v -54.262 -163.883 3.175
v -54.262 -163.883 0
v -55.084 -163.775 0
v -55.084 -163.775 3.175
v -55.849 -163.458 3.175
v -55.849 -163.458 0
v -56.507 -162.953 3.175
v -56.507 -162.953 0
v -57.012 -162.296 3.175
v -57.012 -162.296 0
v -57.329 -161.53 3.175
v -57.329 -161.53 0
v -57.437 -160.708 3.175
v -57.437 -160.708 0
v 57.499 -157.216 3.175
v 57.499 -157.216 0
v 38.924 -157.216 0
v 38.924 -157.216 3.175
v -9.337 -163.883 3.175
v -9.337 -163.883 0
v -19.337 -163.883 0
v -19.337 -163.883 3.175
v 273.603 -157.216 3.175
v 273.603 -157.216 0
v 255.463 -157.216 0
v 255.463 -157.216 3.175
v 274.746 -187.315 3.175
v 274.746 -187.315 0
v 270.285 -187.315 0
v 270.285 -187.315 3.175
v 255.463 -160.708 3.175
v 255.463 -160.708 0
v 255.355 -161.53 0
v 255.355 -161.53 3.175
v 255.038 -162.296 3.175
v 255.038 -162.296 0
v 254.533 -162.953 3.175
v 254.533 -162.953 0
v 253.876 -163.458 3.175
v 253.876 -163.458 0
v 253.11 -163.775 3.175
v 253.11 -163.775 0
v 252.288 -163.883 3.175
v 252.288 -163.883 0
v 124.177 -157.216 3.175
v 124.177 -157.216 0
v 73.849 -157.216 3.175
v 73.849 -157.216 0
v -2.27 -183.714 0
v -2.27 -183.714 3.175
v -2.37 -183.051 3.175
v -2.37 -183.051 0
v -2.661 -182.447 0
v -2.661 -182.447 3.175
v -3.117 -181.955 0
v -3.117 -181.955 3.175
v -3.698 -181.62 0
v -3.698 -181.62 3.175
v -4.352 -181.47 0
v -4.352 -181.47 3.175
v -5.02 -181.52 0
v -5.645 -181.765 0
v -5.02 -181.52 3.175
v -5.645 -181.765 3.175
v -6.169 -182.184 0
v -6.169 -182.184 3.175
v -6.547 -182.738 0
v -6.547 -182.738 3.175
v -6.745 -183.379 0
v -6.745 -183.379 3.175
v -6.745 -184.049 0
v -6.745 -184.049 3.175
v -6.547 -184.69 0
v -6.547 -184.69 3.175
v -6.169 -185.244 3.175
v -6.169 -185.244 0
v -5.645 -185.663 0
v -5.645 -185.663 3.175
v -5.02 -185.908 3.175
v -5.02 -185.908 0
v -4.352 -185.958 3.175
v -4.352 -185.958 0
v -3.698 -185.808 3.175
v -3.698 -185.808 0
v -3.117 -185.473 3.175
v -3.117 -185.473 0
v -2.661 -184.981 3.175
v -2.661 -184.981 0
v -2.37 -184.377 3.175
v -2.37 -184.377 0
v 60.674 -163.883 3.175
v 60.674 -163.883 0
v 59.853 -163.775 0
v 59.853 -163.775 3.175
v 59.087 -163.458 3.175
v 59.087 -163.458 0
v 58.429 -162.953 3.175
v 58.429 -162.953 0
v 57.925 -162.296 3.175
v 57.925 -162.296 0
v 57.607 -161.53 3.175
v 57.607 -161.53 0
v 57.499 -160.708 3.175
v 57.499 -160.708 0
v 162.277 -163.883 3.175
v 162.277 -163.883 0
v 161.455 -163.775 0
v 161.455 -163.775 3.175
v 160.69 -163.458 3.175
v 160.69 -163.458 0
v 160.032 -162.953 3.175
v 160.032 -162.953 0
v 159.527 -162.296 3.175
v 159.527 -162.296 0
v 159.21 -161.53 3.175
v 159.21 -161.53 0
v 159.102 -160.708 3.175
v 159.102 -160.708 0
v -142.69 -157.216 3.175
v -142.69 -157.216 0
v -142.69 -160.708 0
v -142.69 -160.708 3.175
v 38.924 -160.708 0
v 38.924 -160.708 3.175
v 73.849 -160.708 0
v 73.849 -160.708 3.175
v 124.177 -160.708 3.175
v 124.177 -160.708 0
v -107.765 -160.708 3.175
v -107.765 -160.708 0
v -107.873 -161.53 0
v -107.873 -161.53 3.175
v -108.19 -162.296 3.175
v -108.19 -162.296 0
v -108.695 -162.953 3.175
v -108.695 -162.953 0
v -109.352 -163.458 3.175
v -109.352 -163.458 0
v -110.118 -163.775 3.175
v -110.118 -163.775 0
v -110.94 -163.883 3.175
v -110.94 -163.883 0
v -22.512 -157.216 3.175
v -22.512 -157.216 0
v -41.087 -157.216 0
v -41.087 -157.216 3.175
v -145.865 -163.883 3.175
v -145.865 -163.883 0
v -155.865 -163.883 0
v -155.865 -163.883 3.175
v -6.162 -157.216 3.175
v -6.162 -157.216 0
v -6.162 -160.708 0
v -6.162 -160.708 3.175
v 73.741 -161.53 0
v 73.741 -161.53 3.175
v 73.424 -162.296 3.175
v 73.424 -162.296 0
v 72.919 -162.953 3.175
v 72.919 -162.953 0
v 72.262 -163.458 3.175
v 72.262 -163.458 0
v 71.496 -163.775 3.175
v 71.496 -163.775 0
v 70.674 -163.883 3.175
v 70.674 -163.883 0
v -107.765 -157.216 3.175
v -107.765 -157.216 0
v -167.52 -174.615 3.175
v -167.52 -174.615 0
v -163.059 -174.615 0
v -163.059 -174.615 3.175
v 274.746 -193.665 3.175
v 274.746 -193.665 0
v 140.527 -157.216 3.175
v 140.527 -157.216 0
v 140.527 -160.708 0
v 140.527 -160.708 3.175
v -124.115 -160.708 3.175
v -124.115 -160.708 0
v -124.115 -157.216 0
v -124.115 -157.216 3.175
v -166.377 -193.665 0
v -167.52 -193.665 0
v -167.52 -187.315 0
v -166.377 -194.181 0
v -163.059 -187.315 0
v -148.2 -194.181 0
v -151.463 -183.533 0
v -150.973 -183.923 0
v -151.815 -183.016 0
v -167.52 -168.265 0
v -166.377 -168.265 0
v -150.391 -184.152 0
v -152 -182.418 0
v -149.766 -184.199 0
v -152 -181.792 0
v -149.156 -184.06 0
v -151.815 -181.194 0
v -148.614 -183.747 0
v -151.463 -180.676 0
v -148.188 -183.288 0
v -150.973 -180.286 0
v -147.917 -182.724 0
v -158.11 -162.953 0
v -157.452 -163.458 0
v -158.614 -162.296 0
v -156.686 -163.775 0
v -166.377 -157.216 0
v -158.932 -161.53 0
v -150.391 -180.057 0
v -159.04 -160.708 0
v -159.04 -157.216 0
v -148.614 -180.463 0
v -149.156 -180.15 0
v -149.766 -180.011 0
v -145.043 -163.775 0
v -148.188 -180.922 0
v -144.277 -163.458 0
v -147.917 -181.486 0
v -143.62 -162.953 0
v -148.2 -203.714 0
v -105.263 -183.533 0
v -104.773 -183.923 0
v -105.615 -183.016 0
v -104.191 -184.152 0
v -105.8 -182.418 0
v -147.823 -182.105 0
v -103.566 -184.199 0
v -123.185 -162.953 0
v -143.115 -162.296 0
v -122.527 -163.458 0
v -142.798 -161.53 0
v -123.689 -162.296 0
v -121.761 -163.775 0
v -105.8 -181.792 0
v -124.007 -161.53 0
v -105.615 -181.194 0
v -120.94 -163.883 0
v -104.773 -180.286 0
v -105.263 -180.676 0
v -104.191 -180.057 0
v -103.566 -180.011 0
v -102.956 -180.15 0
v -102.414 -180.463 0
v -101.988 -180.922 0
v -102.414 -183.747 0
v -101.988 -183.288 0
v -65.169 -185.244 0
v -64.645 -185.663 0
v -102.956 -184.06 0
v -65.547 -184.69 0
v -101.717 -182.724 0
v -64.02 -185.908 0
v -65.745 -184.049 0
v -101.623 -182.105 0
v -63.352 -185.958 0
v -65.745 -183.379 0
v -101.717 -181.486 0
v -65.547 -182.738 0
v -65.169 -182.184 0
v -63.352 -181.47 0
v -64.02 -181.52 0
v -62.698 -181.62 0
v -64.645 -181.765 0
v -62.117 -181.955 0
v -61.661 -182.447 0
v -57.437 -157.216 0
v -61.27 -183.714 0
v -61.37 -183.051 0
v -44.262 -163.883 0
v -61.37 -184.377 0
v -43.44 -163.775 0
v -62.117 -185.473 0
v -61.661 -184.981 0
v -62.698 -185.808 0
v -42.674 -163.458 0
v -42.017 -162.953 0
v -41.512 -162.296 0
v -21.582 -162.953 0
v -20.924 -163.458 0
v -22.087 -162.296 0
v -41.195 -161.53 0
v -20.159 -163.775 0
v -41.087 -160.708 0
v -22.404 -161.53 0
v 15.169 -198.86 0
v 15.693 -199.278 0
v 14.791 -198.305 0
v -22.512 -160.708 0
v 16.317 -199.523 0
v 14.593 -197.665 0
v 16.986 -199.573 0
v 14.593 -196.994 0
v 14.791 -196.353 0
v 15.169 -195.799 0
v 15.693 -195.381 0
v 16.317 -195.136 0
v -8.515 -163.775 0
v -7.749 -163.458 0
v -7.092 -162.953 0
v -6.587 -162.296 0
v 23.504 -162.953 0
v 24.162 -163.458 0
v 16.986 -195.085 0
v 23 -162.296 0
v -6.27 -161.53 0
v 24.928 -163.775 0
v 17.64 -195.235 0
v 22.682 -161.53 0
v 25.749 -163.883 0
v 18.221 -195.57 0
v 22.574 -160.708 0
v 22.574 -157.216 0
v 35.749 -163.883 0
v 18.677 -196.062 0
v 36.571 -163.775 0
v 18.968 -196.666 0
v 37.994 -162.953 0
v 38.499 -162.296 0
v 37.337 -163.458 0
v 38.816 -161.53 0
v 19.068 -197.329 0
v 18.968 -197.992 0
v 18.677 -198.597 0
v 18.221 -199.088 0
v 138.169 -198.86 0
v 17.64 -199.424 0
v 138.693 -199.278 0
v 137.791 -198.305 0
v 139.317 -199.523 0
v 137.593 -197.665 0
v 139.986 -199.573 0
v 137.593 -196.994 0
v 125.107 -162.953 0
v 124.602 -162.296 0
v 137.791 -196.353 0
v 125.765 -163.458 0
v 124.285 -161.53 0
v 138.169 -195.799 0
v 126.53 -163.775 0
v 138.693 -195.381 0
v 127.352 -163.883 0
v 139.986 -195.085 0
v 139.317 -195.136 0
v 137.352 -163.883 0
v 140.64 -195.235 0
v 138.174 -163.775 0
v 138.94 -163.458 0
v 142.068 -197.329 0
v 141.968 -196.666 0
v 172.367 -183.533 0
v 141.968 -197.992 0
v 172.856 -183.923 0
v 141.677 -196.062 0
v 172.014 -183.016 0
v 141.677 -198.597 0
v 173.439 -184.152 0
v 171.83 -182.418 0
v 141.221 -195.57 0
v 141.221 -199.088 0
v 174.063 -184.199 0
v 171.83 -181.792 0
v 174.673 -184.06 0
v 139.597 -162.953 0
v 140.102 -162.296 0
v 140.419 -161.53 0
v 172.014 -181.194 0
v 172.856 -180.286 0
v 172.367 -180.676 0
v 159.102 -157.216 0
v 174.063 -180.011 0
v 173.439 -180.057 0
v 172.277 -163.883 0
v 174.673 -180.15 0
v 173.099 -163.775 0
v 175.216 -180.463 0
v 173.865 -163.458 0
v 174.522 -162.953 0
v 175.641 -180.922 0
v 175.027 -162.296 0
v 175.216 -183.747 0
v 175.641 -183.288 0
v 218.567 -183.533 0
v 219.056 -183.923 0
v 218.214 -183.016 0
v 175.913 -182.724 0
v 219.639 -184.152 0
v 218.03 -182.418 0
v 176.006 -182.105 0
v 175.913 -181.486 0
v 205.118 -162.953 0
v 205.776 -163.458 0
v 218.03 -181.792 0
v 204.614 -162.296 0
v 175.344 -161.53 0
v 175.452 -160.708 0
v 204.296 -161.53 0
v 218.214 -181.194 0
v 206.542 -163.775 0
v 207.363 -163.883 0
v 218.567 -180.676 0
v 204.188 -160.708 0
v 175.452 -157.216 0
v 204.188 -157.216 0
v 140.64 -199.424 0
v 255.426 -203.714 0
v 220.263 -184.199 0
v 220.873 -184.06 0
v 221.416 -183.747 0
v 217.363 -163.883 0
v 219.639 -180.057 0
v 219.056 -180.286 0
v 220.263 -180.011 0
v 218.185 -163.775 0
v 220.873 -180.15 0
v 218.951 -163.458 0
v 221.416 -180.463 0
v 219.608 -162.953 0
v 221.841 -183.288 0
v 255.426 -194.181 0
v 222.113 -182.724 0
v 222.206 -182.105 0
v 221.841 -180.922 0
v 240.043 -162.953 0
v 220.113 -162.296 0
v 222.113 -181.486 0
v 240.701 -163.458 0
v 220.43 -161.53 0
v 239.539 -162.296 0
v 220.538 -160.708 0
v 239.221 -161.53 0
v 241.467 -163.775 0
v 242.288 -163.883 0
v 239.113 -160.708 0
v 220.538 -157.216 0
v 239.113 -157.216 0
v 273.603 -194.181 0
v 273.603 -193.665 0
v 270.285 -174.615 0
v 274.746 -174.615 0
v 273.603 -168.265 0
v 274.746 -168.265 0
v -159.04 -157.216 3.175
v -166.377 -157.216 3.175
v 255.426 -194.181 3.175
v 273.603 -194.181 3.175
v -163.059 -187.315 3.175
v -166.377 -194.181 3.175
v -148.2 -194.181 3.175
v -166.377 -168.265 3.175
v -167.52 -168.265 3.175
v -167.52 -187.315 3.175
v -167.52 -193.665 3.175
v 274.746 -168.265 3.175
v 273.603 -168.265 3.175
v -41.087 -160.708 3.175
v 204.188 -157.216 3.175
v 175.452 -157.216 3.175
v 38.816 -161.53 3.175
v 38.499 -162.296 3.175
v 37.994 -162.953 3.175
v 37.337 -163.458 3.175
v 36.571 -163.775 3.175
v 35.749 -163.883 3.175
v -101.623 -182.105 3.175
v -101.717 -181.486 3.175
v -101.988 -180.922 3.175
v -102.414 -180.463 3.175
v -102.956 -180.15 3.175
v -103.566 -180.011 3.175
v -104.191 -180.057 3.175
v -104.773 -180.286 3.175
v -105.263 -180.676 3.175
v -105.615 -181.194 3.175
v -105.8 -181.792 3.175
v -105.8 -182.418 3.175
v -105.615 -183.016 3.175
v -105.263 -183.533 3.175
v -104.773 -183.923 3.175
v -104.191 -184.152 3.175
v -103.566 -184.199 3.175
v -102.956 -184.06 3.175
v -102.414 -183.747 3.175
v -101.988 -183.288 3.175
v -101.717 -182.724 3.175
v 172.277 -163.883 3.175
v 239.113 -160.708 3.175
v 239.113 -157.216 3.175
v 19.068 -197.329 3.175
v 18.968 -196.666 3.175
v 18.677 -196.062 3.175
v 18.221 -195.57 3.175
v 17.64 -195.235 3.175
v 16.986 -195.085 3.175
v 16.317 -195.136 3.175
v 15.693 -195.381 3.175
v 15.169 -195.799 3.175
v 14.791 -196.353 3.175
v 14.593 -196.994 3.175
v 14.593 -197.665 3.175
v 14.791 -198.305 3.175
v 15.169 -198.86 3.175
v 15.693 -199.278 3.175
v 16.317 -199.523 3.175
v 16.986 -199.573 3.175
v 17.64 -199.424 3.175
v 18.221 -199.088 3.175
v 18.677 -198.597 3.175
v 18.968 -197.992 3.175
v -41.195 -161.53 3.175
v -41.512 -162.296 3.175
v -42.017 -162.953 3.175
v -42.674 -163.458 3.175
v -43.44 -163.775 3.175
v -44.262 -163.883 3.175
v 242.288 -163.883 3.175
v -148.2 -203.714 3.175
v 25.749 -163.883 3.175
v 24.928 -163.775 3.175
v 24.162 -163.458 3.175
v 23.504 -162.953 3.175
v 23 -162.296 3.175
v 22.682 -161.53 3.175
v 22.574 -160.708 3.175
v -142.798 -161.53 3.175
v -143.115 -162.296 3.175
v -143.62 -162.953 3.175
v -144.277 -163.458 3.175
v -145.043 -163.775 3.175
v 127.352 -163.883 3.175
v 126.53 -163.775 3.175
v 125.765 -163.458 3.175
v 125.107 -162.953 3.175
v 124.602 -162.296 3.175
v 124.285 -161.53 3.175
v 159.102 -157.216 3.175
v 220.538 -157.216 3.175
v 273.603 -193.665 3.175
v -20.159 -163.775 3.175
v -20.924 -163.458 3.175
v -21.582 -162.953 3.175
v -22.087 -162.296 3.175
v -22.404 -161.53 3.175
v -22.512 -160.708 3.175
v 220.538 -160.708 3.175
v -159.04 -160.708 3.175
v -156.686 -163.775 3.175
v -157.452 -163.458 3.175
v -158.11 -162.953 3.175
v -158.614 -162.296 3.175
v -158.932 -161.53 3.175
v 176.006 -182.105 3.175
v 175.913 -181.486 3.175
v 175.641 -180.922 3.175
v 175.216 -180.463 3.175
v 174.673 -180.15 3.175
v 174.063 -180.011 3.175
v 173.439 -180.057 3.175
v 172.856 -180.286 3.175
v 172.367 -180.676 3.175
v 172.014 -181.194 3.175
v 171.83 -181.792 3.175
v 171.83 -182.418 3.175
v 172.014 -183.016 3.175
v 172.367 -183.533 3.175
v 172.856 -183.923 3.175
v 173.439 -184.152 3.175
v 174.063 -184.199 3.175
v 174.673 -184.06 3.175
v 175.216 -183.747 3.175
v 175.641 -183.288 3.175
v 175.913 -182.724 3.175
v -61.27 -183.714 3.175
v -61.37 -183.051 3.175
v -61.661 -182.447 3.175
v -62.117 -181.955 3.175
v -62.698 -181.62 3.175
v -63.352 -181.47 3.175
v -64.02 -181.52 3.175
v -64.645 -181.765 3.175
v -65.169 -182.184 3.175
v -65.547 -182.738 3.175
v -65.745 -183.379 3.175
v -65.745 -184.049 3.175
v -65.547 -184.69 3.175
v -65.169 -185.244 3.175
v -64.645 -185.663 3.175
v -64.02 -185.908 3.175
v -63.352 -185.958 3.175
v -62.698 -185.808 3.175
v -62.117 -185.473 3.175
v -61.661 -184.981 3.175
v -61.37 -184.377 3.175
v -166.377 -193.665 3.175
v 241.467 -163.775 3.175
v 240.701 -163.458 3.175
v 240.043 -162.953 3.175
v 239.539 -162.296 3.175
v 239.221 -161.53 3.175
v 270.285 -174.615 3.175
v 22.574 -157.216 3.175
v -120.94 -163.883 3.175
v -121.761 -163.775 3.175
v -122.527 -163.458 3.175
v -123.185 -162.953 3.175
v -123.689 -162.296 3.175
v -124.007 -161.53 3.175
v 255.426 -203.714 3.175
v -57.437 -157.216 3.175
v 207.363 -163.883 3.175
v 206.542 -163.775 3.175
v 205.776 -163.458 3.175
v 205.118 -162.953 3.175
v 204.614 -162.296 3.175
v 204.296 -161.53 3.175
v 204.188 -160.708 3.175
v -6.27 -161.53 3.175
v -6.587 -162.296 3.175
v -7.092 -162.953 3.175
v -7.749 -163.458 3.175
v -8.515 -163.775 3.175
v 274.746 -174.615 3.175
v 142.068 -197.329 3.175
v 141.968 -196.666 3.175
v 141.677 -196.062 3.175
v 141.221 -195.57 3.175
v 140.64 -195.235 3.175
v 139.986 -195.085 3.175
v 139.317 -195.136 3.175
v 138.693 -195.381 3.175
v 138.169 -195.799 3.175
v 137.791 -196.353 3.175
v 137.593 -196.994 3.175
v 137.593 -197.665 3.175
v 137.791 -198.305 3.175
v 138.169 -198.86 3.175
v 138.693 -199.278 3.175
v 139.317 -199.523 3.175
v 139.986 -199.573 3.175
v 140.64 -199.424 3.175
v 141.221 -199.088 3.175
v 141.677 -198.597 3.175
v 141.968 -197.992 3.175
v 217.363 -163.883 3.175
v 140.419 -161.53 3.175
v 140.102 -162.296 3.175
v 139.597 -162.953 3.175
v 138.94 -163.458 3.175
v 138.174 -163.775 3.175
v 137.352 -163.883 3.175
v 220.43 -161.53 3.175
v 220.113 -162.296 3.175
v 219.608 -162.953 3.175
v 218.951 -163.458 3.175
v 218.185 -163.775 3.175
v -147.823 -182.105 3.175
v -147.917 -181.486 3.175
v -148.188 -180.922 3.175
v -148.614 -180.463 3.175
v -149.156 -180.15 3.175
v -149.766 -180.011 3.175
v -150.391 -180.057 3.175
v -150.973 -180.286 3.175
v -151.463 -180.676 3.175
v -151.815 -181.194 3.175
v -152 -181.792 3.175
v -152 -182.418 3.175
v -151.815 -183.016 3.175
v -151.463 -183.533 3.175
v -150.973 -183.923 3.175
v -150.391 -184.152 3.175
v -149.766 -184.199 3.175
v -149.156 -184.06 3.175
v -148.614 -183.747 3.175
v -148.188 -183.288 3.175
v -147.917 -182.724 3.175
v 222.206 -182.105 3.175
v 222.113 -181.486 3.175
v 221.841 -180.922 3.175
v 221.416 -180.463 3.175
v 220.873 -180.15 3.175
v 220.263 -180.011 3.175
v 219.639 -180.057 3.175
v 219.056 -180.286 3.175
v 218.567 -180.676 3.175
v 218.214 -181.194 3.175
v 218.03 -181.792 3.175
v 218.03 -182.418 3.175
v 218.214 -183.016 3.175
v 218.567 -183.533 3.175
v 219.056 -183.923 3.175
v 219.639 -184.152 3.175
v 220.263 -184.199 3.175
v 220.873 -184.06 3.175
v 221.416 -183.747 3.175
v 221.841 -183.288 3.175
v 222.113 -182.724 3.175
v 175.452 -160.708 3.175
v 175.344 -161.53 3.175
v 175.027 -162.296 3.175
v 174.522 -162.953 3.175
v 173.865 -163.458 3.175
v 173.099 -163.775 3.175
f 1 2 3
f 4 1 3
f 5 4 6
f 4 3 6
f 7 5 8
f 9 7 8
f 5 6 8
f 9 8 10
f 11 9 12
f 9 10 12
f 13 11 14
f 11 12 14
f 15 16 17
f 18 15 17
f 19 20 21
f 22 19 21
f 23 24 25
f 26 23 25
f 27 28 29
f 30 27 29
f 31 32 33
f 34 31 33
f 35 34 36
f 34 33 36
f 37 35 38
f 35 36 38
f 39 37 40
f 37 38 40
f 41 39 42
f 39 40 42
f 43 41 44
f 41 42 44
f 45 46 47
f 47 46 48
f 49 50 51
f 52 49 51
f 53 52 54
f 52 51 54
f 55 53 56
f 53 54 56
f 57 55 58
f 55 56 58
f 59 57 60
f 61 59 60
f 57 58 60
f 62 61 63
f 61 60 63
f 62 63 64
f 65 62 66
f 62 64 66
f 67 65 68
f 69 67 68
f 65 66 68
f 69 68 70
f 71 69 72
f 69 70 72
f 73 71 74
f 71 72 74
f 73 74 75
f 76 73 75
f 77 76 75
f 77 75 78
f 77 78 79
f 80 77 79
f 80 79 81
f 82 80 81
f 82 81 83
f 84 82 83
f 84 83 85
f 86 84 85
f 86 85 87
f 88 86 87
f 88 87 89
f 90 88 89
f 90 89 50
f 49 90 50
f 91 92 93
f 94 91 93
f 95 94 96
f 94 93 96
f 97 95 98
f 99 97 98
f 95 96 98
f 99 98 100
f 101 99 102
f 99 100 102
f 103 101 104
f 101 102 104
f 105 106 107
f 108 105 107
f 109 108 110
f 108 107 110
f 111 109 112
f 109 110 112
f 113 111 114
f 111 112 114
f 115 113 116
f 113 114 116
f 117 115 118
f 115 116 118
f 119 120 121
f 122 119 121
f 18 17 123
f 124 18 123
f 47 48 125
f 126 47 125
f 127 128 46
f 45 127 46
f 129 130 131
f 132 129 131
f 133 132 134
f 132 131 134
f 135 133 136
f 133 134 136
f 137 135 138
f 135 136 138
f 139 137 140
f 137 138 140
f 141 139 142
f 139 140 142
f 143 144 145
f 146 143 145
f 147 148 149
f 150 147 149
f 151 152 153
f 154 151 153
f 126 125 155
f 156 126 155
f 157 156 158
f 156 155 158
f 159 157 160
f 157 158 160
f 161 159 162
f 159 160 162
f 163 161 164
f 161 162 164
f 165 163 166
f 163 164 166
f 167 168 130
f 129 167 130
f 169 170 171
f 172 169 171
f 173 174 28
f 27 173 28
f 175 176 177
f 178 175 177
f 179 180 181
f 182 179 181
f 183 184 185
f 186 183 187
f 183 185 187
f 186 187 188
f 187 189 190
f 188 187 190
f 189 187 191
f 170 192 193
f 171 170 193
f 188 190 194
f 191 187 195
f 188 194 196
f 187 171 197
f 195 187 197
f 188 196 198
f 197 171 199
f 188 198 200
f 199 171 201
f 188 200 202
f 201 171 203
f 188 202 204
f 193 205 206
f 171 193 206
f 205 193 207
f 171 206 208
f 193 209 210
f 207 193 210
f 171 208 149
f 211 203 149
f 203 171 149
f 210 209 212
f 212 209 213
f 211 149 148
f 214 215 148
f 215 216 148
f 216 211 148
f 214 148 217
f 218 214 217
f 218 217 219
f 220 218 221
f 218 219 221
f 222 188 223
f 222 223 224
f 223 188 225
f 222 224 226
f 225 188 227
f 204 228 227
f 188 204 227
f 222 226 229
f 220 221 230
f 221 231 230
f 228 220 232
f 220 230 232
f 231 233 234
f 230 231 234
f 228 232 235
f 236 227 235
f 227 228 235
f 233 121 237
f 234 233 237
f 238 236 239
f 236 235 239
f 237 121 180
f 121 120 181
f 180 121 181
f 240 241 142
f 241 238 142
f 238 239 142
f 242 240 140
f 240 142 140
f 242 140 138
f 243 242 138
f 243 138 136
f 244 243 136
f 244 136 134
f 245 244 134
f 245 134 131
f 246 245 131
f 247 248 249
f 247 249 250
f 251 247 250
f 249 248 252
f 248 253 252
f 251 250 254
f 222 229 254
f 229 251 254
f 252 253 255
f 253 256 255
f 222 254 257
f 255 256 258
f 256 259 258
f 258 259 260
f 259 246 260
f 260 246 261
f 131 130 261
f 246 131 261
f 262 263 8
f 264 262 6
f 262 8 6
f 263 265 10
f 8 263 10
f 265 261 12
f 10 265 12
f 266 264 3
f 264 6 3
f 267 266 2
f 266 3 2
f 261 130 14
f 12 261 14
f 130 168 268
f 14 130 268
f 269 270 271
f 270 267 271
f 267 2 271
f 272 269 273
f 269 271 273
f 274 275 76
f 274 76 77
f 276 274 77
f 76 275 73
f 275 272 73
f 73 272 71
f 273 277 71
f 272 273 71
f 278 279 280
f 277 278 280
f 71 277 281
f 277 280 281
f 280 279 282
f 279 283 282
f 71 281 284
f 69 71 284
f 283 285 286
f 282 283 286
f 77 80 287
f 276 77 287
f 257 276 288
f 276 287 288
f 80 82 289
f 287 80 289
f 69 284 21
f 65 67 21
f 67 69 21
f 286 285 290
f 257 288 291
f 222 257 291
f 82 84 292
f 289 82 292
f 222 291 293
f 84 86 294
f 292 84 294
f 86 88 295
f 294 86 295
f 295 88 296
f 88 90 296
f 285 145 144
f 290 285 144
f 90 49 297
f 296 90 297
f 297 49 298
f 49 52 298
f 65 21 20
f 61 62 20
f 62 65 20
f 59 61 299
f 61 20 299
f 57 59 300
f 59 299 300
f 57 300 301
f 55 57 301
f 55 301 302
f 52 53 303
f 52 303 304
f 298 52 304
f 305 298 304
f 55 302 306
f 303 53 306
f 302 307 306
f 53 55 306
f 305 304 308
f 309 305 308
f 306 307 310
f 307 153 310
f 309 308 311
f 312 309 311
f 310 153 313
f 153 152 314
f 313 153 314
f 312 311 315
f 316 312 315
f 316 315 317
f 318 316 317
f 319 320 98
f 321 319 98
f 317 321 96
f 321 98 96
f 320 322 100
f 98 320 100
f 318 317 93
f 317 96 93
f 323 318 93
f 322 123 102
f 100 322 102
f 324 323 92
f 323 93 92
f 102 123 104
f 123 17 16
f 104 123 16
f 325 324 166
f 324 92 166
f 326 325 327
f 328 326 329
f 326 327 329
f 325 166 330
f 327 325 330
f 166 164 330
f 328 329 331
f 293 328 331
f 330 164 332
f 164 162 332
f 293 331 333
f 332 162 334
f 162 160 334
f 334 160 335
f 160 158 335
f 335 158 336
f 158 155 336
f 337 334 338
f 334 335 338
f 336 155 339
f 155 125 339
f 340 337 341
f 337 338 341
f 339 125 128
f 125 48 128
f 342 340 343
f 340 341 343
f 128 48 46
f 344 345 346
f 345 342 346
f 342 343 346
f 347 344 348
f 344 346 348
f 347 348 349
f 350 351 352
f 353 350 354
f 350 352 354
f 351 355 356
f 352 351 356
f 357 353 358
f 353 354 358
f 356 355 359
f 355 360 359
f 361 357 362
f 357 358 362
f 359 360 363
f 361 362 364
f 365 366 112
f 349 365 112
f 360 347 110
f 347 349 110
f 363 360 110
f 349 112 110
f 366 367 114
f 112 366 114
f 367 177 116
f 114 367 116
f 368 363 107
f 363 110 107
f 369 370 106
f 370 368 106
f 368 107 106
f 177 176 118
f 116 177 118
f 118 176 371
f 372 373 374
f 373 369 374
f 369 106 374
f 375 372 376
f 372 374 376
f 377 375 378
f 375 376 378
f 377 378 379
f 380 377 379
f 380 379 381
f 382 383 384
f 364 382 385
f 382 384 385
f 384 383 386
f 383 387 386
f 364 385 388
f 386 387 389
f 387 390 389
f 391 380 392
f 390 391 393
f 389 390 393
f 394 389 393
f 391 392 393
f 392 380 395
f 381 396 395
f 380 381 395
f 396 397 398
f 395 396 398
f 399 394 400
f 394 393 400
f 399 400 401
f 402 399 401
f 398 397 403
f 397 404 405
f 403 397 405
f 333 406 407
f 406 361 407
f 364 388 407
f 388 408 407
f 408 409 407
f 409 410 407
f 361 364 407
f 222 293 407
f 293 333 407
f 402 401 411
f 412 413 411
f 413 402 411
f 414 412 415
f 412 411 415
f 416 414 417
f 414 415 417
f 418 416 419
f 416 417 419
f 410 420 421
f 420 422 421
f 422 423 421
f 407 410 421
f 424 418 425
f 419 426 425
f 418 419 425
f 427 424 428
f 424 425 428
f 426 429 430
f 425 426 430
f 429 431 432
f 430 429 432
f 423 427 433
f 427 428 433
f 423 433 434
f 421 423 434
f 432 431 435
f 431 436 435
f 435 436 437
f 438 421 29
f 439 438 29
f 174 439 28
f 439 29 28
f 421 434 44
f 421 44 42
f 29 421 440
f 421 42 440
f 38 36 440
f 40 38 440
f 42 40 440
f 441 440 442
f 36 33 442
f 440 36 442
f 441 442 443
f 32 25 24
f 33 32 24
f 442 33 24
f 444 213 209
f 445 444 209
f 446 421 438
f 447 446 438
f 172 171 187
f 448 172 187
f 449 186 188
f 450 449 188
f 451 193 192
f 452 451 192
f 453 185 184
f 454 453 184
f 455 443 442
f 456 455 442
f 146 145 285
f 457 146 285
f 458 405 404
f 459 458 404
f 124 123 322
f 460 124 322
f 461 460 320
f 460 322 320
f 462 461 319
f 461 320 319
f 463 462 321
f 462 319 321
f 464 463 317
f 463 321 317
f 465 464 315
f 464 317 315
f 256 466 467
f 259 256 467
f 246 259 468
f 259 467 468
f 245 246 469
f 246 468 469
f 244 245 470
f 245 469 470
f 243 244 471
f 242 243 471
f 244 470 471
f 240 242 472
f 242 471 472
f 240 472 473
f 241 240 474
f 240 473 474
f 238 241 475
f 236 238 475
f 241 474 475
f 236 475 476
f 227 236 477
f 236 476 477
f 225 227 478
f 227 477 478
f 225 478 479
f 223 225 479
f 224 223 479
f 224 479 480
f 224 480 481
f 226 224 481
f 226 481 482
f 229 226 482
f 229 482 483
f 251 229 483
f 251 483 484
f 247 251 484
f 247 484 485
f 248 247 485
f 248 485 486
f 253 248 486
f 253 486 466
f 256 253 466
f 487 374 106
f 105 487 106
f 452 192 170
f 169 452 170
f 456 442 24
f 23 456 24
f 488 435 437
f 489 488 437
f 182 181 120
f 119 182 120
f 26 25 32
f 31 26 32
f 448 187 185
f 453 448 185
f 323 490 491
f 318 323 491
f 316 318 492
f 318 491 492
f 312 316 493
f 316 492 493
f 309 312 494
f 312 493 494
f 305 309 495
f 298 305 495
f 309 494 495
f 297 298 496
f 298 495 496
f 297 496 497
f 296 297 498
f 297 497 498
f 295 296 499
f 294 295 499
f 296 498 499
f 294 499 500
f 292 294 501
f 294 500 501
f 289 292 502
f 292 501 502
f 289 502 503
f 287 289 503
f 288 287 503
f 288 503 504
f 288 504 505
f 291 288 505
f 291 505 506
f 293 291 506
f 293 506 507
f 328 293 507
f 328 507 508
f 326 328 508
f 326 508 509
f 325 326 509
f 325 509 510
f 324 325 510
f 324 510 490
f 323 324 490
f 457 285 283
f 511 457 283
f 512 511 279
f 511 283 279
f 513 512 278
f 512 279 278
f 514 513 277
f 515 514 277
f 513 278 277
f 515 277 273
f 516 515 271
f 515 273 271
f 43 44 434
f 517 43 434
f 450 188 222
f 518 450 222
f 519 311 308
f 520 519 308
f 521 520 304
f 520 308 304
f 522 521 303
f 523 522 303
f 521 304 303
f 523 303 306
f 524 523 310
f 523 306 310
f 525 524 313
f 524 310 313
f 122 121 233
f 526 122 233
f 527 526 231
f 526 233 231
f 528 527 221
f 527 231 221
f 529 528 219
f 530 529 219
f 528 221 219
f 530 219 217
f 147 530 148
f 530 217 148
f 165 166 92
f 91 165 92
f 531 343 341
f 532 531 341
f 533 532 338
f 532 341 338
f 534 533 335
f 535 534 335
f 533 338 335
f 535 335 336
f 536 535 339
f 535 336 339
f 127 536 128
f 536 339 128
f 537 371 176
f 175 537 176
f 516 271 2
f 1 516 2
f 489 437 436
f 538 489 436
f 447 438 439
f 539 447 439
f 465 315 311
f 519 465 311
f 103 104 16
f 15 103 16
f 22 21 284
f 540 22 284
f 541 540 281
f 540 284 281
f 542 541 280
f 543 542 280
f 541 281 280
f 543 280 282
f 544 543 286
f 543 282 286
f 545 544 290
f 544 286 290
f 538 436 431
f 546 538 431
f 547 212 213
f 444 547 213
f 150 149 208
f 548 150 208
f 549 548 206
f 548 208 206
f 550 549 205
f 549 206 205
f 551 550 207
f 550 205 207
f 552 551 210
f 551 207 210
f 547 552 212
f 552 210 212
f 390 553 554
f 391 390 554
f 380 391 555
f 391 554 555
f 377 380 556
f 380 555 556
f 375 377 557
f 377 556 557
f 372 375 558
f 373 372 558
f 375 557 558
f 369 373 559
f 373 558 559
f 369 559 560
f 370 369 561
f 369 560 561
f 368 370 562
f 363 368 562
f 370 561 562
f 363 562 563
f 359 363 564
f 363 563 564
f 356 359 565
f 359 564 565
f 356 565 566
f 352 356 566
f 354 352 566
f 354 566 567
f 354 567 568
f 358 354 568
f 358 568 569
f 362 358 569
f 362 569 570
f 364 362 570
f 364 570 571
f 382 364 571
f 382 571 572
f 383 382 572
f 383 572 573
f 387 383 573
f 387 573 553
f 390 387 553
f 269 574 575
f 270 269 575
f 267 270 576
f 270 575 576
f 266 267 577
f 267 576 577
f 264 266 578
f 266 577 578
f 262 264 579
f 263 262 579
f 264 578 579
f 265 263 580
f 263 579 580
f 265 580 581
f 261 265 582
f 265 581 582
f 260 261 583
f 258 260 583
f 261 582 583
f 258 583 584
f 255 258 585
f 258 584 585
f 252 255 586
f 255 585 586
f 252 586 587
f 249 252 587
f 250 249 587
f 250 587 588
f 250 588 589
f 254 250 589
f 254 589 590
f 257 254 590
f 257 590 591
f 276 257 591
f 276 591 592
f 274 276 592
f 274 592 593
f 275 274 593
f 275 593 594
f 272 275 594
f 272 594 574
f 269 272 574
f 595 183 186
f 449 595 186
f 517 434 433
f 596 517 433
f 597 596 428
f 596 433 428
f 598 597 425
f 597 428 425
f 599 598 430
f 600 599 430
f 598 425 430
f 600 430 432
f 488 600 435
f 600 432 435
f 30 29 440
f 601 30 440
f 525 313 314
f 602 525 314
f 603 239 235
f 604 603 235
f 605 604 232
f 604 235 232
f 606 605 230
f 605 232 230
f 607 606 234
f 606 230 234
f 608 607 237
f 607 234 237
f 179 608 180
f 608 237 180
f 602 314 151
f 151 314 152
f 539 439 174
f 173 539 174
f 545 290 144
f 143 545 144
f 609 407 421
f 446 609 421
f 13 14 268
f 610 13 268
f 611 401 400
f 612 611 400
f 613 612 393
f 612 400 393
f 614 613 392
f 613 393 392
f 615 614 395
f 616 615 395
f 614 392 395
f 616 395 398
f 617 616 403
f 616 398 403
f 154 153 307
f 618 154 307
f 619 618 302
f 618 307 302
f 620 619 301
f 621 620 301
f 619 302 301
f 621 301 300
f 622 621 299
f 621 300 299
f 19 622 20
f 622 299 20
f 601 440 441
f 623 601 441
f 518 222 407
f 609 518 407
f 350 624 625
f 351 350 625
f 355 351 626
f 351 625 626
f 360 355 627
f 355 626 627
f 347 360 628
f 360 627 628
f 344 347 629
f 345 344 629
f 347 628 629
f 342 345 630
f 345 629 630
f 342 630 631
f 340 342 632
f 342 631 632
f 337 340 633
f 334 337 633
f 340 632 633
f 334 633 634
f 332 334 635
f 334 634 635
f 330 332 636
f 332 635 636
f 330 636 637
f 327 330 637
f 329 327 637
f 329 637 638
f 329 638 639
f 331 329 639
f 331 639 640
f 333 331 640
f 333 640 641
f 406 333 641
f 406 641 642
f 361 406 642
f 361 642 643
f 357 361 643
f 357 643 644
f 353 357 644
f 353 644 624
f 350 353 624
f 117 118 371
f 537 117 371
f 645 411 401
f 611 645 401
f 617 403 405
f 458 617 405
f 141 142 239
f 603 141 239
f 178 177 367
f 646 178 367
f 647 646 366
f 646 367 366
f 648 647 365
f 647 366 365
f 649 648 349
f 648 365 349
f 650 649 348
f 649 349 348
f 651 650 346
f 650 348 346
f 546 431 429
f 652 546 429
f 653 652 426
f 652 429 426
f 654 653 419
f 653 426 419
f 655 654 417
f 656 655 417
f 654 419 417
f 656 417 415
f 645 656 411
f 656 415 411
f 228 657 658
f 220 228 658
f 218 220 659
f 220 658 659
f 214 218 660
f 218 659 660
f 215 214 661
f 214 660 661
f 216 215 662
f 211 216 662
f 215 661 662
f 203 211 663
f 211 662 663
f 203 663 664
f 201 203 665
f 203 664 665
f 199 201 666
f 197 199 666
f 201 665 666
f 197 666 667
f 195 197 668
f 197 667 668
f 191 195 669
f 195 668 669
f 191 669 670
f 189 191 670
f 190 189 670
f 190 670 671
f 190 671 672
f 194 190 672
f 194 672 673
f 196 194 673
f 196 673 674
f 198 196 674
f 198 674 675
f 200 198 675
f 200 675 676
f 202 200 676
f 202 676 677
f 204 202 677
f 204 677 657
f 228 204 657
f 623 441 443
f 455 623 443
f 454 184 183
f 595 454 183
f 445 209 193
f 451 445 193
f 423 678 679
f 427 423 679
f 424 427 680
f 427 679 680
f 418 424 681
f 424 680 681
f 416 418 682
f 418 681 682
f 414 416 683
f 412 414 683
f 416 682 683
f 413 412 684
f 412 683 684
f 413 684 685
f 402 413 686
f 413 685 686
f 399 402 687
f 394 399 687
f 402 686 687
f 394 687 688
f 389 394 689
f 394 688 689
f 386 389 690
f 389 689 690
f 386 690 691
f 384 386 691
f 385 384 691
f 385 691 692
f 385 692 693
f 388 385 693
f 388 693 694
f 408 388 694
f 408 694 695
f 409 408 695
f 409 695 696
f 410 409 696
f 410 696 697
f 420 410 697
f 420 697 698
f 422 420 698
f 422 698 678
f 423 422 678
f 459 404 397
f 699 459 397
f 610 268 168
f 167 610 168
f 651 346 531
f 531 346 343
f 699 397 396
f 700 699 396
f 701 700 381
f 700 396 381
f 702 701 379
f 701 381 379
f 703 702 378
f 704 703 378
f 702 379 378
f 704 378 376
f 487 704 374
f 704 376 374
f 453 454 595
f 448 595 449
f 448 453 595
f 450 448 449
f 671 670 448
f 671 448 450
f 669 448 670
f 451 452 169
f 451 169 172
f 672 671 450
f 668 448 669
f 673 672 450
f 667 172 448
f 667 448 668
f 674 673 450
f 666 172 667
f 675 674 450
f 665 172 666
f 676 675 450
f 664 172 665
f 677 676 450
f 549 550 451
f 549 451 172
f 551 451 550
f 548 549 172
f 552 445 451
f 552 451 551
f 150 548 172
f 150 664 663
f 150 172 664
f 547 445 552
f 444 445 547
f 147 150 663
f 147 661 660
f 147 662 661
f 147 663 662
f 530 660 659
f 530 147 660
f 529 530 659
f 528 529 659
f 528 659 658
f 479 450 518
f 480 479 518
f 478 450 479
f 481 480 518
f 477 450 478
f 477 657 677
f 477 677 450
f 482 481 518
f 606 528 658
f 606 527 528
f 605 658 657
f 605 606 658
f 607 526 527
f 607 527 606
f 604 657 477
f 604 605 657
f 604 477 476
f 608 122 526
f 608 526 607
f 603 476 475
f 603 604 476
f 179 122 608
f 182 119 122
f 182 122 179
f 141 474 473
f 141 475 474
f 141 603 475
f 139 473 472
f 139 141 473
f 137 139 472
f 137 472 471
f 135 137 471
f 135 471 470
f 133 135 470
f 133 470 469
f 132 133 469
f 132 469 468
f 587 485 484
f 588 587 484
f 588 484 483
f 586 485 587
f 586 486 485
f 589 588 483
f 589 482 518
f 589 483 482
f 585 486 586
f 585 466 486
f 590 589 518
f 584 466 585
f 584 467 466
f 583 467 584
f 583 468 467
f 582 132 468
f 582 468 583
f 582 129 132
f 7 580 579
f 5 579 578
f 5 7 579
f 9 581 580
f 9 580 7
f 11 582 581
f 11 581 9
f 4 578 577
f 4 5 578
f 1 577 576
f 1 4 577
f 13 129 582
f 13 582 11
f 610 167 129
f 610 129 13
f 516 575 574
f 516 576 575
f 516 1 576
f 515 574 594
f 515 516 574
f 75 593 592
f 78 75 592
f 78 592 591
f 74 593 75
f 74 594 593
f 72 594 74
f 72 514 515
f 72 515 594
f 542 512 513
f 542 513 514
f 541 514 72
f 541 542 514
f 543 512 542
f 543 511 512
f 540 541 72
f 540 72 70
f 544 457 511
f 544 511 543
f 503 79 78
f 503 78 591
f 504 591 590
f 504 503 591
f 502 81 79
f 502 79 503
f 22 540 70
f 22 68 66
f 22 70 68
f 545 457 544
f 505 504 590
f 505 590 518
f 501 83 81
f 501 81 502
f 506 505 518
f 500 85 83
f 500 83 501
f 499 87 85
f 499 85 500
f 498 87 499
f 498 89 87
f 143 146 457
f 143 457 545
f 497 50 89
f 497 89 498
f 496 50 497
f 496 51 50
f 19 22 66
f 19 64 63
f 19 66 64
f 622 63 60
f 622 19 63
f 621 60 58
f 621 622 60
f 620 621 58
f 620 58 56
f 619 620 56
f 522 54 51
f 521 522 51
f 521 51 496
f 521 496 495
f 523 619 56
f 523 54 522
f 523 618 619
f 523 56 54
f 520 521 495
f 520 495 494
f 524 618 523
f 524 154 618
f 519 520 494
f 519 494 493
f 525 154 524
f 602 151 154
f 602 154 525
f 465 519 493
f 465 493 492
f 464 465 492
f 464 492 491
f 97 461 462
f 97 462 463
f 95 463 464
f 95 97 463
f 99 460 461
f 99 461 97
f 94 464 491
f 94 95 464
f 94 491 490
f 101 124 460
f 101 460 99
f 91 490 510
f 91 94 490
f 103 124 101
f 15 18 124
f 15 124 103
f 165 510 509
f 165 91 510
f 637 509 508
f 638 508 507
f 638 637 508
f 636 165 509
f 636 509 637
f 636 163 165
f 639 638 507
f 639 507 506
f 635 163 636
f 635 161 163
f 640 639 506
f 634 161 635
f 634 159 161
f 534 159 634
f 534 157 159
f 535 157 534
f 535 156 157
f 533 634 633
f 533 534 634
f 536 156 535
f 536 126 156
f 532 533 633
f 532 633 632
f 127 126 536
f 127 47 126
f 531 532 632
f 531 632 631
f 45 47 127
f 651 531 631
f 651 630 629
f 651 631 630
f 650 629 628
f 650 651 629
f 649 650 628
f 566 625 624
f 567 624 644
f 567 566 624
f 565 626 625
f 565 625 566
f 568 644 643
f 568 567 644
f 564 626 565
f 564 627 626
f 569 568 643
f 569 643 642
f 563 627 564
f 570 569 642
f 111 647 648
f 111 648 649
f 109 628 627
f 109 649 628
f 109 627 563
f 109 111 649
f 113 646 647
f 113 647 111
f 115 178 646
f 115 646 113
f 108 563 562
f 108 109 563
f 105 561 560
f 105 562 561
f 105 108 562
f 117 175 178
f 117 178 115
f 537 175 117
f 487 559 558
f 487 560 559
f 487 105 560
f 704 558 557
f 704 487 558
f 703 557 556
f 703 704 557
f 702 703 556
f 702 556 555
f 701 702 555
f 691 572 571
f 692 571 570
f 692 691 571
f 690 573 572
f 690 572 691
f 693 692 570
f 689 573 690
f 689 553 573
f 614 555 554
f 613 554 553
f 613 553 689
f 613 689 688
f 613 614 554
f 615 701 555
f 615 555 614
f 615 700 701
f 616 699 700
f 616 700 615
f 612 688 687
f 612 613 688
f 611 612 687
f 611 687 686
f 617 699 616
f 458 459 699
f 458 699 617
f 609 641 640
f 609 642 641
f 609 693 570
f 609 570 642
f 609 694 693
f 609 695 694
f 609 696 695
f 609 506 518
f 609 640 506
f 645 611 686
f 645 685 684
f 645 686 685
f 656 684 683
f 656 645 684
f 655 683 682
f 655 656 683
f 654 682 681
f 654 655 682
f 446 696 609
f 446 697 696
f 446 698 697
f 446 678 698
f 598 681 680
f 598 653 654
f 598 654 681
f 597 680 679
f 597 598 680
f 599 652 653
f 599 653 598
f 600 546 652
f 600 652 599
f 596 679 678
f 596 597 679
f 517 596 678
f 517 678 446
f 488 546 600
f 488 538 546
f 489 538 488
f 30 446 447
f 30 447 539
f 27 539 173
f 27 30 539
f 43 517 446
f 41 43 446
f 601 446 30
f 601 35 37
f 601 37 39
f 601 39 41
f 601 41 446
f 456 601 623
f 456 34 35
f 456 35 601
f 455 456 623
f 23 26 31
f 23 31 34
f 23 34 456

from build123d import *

# Parameters (mm, degrees)
BOSS_EXTRUDE1_DEPTH = 3.175
SKETCH4_R           = 2.1
SKETCH4_R_2         = 2.249999999
SKETCH4_R_3         = 2.25
CUT_EXTRUDE2_DEPTH  = 343.045224939


with BuildPart() as part:
    # Sketch2 → Boss-Extrude1 (new body)
    with BuildSketch(Plane.XY):
        with BuildLine():
            Line((-166.376823509, -157.21600002), (-166.376823509, -168.26500002))
            Line((-166.376823509, -168.26500002), (-167.519823509, -168.26500002))
            Line((-167.519823509, -168.26500002), (-167.519823509, -174.61500002))
            Line((-167.519823509, -174.61500002), (-163.058823509, -174.61500002))
            Line((-163.058823509, -174.61500002), (-163.058823509, -187.31500002))
            Line((-163.058823509, -187.31500002), (-167.519823509, -187.31500002))
            Line((-167.519823509, -187.31500002), (-167.519823509, -193.66500002))
            Line((-167.519823509, -193.66500002), (-166.376823509, -193.66500002))
            Line((-166.376823509, -193.66500002), (-166.376823509, -194.18100002))
            Line((-166.376823509, -194.18100002), (-148.199823509, -194.18100002))
            Line((-148.199823509, -194.18100002), (-148.199823509, -203.71400002))
            Line((-148.199823509, -203.71400002), (255.426176451, -203.71400002))
            Line((255.426176451, -203.71400002), (255.426176451, -194.18100002))
            Line((255.426176451, -194.18100002), (273.603176451, -194.18100002))
            Line((273.603176451, -194.18100002), (273.603176451, -193.66500002))
            Line((273.603176451, -193.66500002), (274.746176451, -193.66500002))
            Line((274.746176451, -193.66500002), (274.746176451, -187.31500002))
            Line((274.746176451, -187.31500002), (270.285176451, -187.31500002))
            Line((270.285176451, -187.31500002), (270.285176451, -174.61500002))
            Line((270.285176451, -174.61500002), (274.746176451, -174.61500002))
            Line((274.746176451, -174.61500002), (274.746176451, -168.26500002))
            Line((274.746176451, -168.26500002), (273.603176451, -168.26500002))
            Line((273.603176451, -168.26500002), (273.603176451, -157.21600002))
            Line((273.603176451, -157.21600002), (255.463301471, -157.21600002))
            Line((255.463301471, -157.21600002), (255.463301471, -160.70800002))
            ThreePointArc((255.463301471, -160.70800002), (254.533365501, -162.95306405), (252.288301471, -163.88300002))
            Line((252.288301471, -163.88300002), (242.288301471, -163.88300002))
            ThreePointArc((242.288301471, -163.88300002), (240.04323744, -162.95306405), (239.113301471, -160.70800002))
            Line((239.113301471, -160.70800002), (239.113301471, -157.21600002))
            Line((239.113301471, -157.21600002), (220.538301471, -157.21600002))
            Line((220.538301471, -157.21600002), (220.538301471, -160.70800002))
            ThreePointArc((220.538301471, -160.70800002), (219.608365501, -162.95306405), (217.363301471, -163.88300002))
            Line((217.363301471, -163.88300002), (207.363301471, -163.88300002))
            ThreePointArc((207.363301471, -163.88300002), (205.11823744, -162.95306405), (204.188301471, -160.70800002))
            Line((204.188301471, -160.70800002), (204.188301471, -157.21600002))
            Line((204.188301471, -157.21600002), (175.452051471, -157.21600002))
            Line((175.452051471, -157.21600002), (175.452051471, -160.70800002))
            ThreePointArc((175.452051471, -160.70800002), (174.522115501, -162.95306405), (172.277051471, -163.88300002))
            Line((172.277051471, -163.88300002), (162.277051471, -163.88300002))
            ThreePointArc((162.277051471, -163.88300002), (160.03198744, -162.95306405), (159.102051471, -160.70800002))
            Line((159.102051471, -160.70800002), (159.102051471, -157.21600002))
            Line((159.102051471, -157.21600002), (140.527051471, -157.21600002))
            Line((140.527051471, -157.21600002), (140.527051471, -160.70800002))
            ThreePointArc((140.527051471, -160.70800002), (139.597115501, -162.95306405), (137.352051471, -163.88300002))
            Line((137.352051471, -163.88300002), (127.352051471, -163.88300002))
            ThreePointArc((127.352051471, -163.88300002), (125.10698744, -162.95306405), (124.177051471, -160.70800002))
            Line((124.177051471, -160.70800002), (124.177051471, -157.21600002))
            Line((124.177051471, -157.21600002), (73.849301471, -157.21600002))
            Line((73.849301471, -157.21600002), (73.849301471, -160.70800002))
            ThreePointArc((73.849301471, -160.70800002), (72.919365501, -162.95306405), (70.674301471, -163.88300002))
            Line((70.674301471, -163.88300002), (60.674301471, -163.88300002))
            ThreePointArc((60.674301471, -163.88300002), (58.42923744, -162.95306405), (57.499301471, -160.70800002))
            Line((57.499301471, -160.70800002), (57.499301471, -157.21600002))
            Line((57.499301471, -157.21600002), (38.924301471, -157.21600002))
            Line((38.924301471, -157.21600002), (38.924301471, -160.70800002))
            ThreePointArc((38.924301471, -160.70800002), (37.994365501, -162.95306405), (35.749301471, -163.88300002))
            Line((35.749301471, -163.88300002), (25.749301471, -163.88300002))
            ThreePointArc((25.749301471, -163.88300002), (23.50423744, -162.95306405), (22.574301471, -160.70800002))
            Line((22.574301471, -160.70800002), (22.574301471, -157.21600002))
            Line((22.574301471, -157.21600002), (-6.161948529, -157.21600002))
            Line((-6.161948529, -157.21600002), (-6.161948529, -160.70800002))
            ThreePointArc((-6.161948529, -160.70800002), (-7.091884499, -162.95306405), (-9.336948529, -163.88300002))
            Line((-9.336948529, -163.88300002), (-19.336948529, -163.88300002))
            ThreePointArc((-19.336948529, -163.88300002), (-21.58201256, -162.95306405), (-22.511948529, -160.70800002))
            Line((-22.511948529, -160.70800002), (-22.511948529, -157.21600002))
            Line((-22.511948529, -157.21600002), (-41.086948529, -157.21600002))
            Line((-41.086948529, -157.21600002), (-41.086948529, -160.70800002))
            ThreePointArc((-41.086948529, -160.70800002), (-42.016884499, -162.95306405), (-44.261948529, -163.88300002))
            Line((-44.261948529, -163.88300002), (-54.261948529, -163.88300002))
            ThreePointArc((-54.261948529, -163.88300002), (-56.50701256, -162.95306405), (-57.436948529, -160.70800002))
            Line((-57.436948529, -160.70800002), (-57.436948529, -157.21600002))
            Line((-57.436948529, -157.21600002), (-107.764698529, -157.21600002))
            Line((-107.764698529, -157.21600002), (-107.764698529, -160.70800002))
            ThreePointArc((-107.764698529, -160.70800002), (-108.694634499, -162.95306405), (-110.939698529, -163.88300002))
            Line((-110.939698529, -163.88300002), (-120.939698529, -163.88300002))
            ThreePointArc((-120.939698529, -163.88300002), (-123.18476256, -162.95306405), (-124.114698529, -160.70800002))
            Line((-124.114698529, -160.70800002), (-124.114698529, -157.21600002))
            Line((-124.114698529, -157.21600002), (-142.689698529, -157.21600002))
            Line((-142.689698529, -157.21600002), (-142.689698529, -160.70800002))
            ThreePointArc((-142.689698529, -160.70800002), (-143.619634499, -162.95306405), (-145.864698529, -163.88300002))
            Line((-145.864698529, -163.88300002), (-155.864698529, -163.88300002))
            ThreePointArc((-155.864698529, -163.88300002), (-158.10976256, -162.95306405), (-159.039698529, -160.70800002))
            Line((-159.039698529, -160.70800002), (-159.039698529, -157.21600002))
            Line((-159.039698529, -157.21600002), (-166.376823509, -157.21600002))
        make_face()
    extrude(amount=BOSS_EXTRUDE1_DEPTH)

    # Sketch4 → Cut-Extrude2 (cut, through all)
    with BuildSketch(Plane.XY.offset(3.175)):
        with Locations((220.106176451, -182.10474)):
            Circle(SKETCH4_R)
        with Locations((173.906176451, -182.10474)):
            Circle(SKETCH4_R)
        with Locations((139.818076453, -197.329197783)):
            Circle(SKETCH4_R_2)
        with Locations((16.818076453, -197.329197783)):
            Circle(SKETCH4_R_2)
        with Locations((-4.519823509, -183.71400002)):
            Circle(SKETCH4_R_3)
        with Locations((-63.519823509, -183.71400002)):
            Circle(SKETCH4_R_3)
        with Locations((-103.723323529, -182.10474)):
            Circle(SKETCH4_R)
        with Locations((-149.923323529, -182.10474)):
            Circle(SKETCH4_R)
    extrude(amount=-CUT_EXTRUDE2_DEPTH, mode=Mode.SUBTRACT)


solid = part.part
